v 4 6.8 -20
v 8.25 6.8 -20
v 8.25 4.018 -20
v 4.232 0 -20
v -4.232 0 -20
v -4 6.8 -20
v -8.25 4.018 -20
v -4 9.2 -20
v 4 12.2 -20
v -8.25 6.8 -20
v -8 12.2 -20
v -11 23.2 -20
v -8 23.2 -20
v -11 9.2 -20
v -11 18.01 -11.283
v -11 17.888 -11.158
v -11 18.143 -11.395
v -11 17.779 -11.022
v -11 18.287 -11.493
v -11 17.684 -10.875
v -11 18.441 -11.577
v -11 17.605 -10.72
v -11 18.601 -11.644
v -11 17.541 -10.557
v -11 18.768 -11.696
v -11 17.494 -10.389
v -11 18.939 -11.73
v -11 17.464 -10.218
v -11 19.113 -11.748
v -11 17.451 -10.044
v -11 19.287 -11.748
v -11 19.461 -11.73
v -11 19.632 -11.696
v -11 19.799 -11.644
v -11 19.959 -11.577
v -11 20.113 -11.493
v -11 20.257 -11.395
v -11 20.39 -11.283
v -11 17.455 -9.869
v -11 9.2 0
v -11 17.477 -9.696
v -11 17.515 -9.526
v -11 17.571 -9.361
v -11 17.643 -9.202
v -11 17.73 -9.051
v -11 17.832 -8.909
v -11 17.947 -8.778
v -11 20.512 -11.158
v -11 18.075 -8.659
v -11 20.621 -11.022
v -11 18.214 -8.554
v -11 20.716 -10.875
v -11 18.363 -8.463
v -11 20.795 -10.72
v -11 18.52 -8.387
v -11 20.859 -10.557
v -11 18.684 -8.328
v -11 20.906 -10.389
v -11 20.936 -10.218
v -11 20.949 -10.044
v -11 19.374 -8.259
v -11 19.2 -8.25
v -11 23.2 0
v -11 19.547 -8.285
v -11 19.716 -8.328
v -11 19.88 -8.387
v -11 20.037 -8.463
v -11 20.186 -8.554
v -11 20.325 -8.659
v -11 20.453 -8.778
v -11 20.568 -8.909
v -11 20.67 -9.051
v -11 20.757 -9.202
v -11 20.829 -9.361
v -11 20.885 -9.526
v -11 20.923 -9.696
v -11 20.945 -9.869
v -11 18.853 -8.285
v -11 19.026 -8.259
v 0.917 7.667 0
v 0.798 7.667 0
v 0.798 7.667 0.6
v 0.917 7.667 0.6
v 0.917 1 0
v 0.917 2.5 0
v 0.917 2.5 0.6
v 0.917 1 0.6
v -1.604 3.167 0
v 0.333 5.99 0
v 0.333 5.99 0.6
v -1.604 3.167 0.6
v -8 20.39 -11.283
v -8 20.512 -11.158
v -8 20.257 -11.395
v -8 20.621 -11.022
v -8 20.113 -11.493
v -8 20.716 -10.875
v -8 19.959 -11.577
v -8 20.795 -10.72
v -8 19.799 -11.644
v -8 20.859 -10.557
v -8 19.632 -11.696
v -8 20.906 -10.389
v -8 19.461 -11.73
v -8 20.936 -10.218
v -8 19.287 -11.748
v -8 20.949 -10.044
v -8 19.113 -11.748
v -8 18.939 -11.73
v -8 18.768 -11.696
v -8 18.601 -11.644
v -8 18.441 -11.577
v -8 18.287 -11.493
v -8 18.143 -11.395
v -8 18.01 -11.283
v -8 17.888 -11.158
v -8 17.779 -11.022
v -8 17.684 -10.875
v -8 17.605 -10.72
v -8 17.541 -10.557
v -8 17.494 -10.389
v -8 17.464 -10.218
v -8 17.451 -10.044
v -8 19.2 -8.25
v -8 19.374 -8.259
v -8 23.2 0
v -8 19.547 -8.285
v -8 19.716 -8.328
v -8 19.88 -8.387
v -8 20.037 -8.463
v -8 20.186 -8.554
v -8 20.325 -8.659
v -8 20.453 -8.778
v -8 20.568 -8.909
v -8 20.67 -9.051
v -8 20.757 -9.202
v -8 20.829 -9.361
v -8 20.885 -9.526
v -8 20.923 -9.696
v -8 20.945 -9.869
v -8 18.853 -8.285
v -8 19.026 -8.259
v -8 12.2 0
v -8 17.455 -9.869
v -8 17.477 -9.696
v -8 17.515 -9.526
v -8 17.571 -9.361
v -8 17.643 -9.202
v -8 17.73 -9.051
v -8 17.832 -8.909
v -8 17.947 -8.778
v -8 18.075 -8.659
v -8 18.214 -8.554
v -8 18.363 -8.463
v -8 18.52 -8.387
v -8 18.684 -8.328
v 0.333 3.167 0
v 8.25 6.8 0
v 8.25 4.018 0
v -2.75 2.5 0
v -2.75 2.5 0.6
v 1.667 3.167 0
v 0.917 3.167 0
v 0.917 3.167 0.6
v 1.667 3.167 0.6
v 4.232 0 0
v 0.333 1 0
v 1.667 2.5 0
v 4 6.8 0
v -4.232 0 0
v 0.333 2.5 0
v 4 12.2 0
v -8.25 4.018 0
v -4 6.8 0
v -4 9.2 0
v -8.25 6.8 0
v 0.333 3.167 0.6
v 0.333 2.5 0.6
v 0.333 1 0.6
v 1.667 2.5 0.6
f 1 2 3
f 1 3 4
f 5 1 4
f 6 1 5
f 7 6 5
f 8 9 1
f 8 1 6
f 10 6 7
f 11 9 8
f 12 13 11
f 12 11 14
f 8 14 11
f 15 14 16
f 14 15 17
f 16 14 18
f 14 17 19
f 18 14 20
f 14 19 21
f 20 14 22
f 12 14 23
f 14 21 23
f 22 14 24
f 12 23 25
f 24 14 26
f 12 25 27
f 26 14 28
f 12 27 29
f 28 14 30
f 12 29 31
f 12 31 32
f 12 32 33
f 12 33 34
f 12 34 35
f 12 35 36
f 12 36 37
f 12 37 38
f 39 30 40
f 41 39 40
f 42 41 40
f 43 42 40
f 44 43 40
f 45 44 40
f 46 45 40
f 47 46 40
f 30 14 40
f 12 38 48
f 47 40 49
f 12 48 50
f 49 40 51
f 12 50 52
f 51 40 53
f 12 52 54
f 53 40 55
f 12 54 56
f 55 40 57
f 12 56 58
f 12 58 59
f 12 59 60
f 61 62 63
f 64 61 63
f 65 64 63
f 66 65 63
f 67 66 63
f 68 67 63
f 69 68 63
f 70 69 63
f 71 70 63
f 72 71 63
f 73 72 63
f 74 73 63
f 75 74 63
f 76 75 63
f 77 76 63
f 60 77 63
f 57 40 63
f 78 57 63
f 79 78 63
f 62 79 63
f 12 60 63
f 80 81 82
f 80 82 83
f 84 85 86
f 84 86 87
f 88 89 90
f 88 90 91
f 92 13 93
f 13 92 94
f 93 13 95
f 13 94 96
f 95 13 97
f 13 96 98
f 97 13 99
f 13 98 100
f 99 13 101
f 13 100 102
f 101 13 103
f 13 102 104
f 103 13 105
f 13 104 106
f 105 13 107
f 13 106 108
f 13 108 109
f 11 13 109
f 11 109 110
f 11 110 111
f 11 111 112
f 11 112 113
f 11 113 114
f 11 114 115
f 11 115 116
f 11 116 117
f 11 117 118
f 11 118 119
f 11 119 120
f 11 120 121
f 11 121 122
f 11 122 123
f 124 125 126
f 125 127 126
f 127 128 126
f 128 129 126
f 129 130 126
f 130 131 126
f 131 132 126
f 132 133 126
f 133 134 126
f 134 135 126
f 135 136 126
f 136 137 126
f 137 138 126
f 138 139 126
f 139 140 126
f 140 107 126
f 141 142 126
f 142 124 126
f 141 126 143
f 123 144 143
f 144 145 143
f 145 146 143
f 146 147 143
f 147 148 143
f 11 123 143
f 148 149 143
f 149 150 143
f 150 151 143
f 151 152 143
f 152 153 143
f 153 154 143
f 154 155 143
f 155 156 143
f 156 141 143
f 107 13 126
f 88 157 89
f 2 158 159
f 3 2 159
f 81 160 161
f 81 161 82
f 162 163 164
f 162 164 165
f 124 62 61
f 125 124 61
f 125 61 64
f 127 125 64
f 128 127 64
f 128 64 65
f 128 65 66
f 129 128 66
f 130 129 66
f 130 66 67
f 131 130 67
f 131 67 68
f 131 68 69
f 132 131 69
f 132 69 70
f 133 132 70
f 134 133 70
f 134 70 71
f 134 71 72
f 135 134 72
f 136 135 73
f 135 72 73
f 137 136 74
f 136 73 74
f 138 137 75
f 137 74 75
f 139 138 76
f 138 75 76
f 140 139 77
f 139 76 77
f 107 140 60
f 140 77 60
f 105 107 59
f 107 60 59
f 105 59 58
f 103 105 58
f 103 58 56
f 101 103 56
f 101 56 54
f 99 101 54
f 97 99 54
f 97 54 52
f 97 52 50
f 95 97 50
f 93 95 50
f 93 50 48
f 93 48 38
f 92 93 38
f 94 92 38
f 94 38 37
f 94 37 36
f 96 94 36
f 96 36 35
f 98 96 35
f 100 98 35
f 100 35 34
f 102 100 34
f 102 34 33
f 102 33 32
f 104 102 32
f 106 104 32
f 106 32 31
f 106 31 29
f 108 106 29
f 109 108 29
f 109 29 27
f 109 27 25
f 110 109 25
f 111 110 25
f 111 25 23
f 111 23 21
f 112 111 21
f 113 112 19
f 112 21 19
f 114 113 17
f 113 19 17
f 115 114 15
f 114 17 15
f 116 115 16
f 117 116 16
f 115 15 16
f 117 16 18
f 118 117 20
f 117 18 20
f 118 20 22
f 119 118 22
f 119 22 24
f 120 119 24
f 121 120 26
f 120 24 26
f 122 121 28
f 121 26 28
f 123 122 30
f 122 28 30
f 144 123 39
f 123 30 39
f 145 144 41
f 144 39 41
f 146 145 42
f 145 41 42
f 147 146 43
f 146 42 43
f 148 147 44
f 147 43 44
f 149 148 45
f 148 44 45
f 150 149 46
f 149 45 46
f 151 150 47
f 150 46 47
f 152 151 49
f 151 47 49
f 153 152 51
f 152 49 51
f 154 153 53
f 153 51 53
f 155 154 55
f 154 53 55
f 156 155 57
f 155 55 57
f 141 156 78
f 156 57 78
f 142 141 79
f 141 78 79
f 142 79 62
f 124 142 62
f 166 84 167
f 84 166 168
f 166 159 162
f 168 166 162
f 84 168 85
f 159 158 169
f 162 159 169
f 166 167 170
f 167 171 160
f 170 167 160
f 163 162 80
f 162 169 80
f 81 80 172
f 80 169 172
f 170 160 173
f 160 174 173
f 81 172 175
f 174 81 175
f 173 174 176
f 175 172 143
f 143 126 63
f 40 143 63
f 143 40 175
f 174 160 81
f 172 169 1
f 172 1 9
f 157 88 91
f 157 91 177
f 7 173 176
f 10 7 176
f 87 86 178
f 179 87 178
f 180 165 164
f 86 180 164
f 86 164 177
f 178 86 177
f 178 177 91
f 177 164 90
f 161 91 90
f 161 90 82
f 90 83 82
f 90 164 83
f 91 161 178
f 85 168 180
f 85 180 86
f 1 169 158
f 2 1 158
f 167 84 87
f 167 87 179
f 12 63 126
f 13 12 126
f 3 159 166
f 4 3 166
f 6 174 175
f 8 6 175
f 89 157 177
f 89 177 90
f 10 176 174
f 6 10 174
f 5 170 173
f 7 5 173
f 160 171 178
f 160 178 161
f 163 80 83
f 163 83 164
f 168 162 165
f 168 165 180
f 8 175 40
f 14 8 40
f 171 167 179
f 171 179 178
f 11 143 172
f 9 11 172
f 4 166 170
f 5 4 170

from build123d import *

# Parameters (mm, degrees)
ESTRUSIONE_ESTRUSIONE1_DEPTH = 20
TAGLIO_ESTRUSIONE1_REACH     = 38.177
SCHIZZO6_R                   = 1.75
ESTRUSIONE_ESTRUSIONE2_DEPTH = 0.6


with BuildPart() as part:
    # Schizzo2 → Estrusione-Estrusione1 (new body)
    with BuildSketch(Plane.XY):
        Polygon((-4, 9.2), (-11, 9.2), (-11, 23.2), (-8, 23.2), (-8, 12.2), (4, 12.2), (4, 9.2), (4, 6.8), (8.25, 6.8), (8.25, 4.017766953), (4.232233047, 0), (-4.232233047, 0), (-8.25, 4.017766953), (-8.25, 6.8), (-4, 6.8), align=None)
    extrude(amount=-ESTRUSIONE_ESTRUSIONE1_DEPTH)

    # Schizzo6 → Taglio-Estrusione1 (cut, up to next)
    with BuildSketch(Plane.ZY.offset(11), mode=Mode.PRIVATE) as taglio_estrusione1_sk1:
        with Locations((-10, 19.2)):
            Circle(SCHIZZO6_R)
    taglio_estrusione1_tool1 = extrude(taglio_estrusione1_sk1.sketch, amount=-TAGLIO_ESTRUSIONE1_REACH, mode=Mode.PRIVATE) & part.part
    add(taglio_estrusione1_tool1.solids().sort_by_distance((-11, 19.2, -10))[0], mode=Mode.SUBTRACT)

    # Schizzo7 → Estrusione-Estrusione2 (add)
    with BuildSketch(Plane.XY):
        Polygon((0.798177083, 7.666666667), (0.916666667, 7.666666667), (0.916666667, 3.166666667), (1.666666667, 3.166666667), (1.666666667, 2.5), (0.916666667, 2.5), (0.916666667, 1), (0.333333333, 1), (0.333333333, 2.5), (-2.75, 2.5), align=None)
        Polygon((0.333333333, 3.166666667), (0.333333333, 5.989583333), (-1.604166667, 3.166666667), align=None, mode=Mode.SUBTRACT)
    extrude(amount=ESTRUSIONE_ESTRUSIONE2_DEPTH)


solid = part.part
